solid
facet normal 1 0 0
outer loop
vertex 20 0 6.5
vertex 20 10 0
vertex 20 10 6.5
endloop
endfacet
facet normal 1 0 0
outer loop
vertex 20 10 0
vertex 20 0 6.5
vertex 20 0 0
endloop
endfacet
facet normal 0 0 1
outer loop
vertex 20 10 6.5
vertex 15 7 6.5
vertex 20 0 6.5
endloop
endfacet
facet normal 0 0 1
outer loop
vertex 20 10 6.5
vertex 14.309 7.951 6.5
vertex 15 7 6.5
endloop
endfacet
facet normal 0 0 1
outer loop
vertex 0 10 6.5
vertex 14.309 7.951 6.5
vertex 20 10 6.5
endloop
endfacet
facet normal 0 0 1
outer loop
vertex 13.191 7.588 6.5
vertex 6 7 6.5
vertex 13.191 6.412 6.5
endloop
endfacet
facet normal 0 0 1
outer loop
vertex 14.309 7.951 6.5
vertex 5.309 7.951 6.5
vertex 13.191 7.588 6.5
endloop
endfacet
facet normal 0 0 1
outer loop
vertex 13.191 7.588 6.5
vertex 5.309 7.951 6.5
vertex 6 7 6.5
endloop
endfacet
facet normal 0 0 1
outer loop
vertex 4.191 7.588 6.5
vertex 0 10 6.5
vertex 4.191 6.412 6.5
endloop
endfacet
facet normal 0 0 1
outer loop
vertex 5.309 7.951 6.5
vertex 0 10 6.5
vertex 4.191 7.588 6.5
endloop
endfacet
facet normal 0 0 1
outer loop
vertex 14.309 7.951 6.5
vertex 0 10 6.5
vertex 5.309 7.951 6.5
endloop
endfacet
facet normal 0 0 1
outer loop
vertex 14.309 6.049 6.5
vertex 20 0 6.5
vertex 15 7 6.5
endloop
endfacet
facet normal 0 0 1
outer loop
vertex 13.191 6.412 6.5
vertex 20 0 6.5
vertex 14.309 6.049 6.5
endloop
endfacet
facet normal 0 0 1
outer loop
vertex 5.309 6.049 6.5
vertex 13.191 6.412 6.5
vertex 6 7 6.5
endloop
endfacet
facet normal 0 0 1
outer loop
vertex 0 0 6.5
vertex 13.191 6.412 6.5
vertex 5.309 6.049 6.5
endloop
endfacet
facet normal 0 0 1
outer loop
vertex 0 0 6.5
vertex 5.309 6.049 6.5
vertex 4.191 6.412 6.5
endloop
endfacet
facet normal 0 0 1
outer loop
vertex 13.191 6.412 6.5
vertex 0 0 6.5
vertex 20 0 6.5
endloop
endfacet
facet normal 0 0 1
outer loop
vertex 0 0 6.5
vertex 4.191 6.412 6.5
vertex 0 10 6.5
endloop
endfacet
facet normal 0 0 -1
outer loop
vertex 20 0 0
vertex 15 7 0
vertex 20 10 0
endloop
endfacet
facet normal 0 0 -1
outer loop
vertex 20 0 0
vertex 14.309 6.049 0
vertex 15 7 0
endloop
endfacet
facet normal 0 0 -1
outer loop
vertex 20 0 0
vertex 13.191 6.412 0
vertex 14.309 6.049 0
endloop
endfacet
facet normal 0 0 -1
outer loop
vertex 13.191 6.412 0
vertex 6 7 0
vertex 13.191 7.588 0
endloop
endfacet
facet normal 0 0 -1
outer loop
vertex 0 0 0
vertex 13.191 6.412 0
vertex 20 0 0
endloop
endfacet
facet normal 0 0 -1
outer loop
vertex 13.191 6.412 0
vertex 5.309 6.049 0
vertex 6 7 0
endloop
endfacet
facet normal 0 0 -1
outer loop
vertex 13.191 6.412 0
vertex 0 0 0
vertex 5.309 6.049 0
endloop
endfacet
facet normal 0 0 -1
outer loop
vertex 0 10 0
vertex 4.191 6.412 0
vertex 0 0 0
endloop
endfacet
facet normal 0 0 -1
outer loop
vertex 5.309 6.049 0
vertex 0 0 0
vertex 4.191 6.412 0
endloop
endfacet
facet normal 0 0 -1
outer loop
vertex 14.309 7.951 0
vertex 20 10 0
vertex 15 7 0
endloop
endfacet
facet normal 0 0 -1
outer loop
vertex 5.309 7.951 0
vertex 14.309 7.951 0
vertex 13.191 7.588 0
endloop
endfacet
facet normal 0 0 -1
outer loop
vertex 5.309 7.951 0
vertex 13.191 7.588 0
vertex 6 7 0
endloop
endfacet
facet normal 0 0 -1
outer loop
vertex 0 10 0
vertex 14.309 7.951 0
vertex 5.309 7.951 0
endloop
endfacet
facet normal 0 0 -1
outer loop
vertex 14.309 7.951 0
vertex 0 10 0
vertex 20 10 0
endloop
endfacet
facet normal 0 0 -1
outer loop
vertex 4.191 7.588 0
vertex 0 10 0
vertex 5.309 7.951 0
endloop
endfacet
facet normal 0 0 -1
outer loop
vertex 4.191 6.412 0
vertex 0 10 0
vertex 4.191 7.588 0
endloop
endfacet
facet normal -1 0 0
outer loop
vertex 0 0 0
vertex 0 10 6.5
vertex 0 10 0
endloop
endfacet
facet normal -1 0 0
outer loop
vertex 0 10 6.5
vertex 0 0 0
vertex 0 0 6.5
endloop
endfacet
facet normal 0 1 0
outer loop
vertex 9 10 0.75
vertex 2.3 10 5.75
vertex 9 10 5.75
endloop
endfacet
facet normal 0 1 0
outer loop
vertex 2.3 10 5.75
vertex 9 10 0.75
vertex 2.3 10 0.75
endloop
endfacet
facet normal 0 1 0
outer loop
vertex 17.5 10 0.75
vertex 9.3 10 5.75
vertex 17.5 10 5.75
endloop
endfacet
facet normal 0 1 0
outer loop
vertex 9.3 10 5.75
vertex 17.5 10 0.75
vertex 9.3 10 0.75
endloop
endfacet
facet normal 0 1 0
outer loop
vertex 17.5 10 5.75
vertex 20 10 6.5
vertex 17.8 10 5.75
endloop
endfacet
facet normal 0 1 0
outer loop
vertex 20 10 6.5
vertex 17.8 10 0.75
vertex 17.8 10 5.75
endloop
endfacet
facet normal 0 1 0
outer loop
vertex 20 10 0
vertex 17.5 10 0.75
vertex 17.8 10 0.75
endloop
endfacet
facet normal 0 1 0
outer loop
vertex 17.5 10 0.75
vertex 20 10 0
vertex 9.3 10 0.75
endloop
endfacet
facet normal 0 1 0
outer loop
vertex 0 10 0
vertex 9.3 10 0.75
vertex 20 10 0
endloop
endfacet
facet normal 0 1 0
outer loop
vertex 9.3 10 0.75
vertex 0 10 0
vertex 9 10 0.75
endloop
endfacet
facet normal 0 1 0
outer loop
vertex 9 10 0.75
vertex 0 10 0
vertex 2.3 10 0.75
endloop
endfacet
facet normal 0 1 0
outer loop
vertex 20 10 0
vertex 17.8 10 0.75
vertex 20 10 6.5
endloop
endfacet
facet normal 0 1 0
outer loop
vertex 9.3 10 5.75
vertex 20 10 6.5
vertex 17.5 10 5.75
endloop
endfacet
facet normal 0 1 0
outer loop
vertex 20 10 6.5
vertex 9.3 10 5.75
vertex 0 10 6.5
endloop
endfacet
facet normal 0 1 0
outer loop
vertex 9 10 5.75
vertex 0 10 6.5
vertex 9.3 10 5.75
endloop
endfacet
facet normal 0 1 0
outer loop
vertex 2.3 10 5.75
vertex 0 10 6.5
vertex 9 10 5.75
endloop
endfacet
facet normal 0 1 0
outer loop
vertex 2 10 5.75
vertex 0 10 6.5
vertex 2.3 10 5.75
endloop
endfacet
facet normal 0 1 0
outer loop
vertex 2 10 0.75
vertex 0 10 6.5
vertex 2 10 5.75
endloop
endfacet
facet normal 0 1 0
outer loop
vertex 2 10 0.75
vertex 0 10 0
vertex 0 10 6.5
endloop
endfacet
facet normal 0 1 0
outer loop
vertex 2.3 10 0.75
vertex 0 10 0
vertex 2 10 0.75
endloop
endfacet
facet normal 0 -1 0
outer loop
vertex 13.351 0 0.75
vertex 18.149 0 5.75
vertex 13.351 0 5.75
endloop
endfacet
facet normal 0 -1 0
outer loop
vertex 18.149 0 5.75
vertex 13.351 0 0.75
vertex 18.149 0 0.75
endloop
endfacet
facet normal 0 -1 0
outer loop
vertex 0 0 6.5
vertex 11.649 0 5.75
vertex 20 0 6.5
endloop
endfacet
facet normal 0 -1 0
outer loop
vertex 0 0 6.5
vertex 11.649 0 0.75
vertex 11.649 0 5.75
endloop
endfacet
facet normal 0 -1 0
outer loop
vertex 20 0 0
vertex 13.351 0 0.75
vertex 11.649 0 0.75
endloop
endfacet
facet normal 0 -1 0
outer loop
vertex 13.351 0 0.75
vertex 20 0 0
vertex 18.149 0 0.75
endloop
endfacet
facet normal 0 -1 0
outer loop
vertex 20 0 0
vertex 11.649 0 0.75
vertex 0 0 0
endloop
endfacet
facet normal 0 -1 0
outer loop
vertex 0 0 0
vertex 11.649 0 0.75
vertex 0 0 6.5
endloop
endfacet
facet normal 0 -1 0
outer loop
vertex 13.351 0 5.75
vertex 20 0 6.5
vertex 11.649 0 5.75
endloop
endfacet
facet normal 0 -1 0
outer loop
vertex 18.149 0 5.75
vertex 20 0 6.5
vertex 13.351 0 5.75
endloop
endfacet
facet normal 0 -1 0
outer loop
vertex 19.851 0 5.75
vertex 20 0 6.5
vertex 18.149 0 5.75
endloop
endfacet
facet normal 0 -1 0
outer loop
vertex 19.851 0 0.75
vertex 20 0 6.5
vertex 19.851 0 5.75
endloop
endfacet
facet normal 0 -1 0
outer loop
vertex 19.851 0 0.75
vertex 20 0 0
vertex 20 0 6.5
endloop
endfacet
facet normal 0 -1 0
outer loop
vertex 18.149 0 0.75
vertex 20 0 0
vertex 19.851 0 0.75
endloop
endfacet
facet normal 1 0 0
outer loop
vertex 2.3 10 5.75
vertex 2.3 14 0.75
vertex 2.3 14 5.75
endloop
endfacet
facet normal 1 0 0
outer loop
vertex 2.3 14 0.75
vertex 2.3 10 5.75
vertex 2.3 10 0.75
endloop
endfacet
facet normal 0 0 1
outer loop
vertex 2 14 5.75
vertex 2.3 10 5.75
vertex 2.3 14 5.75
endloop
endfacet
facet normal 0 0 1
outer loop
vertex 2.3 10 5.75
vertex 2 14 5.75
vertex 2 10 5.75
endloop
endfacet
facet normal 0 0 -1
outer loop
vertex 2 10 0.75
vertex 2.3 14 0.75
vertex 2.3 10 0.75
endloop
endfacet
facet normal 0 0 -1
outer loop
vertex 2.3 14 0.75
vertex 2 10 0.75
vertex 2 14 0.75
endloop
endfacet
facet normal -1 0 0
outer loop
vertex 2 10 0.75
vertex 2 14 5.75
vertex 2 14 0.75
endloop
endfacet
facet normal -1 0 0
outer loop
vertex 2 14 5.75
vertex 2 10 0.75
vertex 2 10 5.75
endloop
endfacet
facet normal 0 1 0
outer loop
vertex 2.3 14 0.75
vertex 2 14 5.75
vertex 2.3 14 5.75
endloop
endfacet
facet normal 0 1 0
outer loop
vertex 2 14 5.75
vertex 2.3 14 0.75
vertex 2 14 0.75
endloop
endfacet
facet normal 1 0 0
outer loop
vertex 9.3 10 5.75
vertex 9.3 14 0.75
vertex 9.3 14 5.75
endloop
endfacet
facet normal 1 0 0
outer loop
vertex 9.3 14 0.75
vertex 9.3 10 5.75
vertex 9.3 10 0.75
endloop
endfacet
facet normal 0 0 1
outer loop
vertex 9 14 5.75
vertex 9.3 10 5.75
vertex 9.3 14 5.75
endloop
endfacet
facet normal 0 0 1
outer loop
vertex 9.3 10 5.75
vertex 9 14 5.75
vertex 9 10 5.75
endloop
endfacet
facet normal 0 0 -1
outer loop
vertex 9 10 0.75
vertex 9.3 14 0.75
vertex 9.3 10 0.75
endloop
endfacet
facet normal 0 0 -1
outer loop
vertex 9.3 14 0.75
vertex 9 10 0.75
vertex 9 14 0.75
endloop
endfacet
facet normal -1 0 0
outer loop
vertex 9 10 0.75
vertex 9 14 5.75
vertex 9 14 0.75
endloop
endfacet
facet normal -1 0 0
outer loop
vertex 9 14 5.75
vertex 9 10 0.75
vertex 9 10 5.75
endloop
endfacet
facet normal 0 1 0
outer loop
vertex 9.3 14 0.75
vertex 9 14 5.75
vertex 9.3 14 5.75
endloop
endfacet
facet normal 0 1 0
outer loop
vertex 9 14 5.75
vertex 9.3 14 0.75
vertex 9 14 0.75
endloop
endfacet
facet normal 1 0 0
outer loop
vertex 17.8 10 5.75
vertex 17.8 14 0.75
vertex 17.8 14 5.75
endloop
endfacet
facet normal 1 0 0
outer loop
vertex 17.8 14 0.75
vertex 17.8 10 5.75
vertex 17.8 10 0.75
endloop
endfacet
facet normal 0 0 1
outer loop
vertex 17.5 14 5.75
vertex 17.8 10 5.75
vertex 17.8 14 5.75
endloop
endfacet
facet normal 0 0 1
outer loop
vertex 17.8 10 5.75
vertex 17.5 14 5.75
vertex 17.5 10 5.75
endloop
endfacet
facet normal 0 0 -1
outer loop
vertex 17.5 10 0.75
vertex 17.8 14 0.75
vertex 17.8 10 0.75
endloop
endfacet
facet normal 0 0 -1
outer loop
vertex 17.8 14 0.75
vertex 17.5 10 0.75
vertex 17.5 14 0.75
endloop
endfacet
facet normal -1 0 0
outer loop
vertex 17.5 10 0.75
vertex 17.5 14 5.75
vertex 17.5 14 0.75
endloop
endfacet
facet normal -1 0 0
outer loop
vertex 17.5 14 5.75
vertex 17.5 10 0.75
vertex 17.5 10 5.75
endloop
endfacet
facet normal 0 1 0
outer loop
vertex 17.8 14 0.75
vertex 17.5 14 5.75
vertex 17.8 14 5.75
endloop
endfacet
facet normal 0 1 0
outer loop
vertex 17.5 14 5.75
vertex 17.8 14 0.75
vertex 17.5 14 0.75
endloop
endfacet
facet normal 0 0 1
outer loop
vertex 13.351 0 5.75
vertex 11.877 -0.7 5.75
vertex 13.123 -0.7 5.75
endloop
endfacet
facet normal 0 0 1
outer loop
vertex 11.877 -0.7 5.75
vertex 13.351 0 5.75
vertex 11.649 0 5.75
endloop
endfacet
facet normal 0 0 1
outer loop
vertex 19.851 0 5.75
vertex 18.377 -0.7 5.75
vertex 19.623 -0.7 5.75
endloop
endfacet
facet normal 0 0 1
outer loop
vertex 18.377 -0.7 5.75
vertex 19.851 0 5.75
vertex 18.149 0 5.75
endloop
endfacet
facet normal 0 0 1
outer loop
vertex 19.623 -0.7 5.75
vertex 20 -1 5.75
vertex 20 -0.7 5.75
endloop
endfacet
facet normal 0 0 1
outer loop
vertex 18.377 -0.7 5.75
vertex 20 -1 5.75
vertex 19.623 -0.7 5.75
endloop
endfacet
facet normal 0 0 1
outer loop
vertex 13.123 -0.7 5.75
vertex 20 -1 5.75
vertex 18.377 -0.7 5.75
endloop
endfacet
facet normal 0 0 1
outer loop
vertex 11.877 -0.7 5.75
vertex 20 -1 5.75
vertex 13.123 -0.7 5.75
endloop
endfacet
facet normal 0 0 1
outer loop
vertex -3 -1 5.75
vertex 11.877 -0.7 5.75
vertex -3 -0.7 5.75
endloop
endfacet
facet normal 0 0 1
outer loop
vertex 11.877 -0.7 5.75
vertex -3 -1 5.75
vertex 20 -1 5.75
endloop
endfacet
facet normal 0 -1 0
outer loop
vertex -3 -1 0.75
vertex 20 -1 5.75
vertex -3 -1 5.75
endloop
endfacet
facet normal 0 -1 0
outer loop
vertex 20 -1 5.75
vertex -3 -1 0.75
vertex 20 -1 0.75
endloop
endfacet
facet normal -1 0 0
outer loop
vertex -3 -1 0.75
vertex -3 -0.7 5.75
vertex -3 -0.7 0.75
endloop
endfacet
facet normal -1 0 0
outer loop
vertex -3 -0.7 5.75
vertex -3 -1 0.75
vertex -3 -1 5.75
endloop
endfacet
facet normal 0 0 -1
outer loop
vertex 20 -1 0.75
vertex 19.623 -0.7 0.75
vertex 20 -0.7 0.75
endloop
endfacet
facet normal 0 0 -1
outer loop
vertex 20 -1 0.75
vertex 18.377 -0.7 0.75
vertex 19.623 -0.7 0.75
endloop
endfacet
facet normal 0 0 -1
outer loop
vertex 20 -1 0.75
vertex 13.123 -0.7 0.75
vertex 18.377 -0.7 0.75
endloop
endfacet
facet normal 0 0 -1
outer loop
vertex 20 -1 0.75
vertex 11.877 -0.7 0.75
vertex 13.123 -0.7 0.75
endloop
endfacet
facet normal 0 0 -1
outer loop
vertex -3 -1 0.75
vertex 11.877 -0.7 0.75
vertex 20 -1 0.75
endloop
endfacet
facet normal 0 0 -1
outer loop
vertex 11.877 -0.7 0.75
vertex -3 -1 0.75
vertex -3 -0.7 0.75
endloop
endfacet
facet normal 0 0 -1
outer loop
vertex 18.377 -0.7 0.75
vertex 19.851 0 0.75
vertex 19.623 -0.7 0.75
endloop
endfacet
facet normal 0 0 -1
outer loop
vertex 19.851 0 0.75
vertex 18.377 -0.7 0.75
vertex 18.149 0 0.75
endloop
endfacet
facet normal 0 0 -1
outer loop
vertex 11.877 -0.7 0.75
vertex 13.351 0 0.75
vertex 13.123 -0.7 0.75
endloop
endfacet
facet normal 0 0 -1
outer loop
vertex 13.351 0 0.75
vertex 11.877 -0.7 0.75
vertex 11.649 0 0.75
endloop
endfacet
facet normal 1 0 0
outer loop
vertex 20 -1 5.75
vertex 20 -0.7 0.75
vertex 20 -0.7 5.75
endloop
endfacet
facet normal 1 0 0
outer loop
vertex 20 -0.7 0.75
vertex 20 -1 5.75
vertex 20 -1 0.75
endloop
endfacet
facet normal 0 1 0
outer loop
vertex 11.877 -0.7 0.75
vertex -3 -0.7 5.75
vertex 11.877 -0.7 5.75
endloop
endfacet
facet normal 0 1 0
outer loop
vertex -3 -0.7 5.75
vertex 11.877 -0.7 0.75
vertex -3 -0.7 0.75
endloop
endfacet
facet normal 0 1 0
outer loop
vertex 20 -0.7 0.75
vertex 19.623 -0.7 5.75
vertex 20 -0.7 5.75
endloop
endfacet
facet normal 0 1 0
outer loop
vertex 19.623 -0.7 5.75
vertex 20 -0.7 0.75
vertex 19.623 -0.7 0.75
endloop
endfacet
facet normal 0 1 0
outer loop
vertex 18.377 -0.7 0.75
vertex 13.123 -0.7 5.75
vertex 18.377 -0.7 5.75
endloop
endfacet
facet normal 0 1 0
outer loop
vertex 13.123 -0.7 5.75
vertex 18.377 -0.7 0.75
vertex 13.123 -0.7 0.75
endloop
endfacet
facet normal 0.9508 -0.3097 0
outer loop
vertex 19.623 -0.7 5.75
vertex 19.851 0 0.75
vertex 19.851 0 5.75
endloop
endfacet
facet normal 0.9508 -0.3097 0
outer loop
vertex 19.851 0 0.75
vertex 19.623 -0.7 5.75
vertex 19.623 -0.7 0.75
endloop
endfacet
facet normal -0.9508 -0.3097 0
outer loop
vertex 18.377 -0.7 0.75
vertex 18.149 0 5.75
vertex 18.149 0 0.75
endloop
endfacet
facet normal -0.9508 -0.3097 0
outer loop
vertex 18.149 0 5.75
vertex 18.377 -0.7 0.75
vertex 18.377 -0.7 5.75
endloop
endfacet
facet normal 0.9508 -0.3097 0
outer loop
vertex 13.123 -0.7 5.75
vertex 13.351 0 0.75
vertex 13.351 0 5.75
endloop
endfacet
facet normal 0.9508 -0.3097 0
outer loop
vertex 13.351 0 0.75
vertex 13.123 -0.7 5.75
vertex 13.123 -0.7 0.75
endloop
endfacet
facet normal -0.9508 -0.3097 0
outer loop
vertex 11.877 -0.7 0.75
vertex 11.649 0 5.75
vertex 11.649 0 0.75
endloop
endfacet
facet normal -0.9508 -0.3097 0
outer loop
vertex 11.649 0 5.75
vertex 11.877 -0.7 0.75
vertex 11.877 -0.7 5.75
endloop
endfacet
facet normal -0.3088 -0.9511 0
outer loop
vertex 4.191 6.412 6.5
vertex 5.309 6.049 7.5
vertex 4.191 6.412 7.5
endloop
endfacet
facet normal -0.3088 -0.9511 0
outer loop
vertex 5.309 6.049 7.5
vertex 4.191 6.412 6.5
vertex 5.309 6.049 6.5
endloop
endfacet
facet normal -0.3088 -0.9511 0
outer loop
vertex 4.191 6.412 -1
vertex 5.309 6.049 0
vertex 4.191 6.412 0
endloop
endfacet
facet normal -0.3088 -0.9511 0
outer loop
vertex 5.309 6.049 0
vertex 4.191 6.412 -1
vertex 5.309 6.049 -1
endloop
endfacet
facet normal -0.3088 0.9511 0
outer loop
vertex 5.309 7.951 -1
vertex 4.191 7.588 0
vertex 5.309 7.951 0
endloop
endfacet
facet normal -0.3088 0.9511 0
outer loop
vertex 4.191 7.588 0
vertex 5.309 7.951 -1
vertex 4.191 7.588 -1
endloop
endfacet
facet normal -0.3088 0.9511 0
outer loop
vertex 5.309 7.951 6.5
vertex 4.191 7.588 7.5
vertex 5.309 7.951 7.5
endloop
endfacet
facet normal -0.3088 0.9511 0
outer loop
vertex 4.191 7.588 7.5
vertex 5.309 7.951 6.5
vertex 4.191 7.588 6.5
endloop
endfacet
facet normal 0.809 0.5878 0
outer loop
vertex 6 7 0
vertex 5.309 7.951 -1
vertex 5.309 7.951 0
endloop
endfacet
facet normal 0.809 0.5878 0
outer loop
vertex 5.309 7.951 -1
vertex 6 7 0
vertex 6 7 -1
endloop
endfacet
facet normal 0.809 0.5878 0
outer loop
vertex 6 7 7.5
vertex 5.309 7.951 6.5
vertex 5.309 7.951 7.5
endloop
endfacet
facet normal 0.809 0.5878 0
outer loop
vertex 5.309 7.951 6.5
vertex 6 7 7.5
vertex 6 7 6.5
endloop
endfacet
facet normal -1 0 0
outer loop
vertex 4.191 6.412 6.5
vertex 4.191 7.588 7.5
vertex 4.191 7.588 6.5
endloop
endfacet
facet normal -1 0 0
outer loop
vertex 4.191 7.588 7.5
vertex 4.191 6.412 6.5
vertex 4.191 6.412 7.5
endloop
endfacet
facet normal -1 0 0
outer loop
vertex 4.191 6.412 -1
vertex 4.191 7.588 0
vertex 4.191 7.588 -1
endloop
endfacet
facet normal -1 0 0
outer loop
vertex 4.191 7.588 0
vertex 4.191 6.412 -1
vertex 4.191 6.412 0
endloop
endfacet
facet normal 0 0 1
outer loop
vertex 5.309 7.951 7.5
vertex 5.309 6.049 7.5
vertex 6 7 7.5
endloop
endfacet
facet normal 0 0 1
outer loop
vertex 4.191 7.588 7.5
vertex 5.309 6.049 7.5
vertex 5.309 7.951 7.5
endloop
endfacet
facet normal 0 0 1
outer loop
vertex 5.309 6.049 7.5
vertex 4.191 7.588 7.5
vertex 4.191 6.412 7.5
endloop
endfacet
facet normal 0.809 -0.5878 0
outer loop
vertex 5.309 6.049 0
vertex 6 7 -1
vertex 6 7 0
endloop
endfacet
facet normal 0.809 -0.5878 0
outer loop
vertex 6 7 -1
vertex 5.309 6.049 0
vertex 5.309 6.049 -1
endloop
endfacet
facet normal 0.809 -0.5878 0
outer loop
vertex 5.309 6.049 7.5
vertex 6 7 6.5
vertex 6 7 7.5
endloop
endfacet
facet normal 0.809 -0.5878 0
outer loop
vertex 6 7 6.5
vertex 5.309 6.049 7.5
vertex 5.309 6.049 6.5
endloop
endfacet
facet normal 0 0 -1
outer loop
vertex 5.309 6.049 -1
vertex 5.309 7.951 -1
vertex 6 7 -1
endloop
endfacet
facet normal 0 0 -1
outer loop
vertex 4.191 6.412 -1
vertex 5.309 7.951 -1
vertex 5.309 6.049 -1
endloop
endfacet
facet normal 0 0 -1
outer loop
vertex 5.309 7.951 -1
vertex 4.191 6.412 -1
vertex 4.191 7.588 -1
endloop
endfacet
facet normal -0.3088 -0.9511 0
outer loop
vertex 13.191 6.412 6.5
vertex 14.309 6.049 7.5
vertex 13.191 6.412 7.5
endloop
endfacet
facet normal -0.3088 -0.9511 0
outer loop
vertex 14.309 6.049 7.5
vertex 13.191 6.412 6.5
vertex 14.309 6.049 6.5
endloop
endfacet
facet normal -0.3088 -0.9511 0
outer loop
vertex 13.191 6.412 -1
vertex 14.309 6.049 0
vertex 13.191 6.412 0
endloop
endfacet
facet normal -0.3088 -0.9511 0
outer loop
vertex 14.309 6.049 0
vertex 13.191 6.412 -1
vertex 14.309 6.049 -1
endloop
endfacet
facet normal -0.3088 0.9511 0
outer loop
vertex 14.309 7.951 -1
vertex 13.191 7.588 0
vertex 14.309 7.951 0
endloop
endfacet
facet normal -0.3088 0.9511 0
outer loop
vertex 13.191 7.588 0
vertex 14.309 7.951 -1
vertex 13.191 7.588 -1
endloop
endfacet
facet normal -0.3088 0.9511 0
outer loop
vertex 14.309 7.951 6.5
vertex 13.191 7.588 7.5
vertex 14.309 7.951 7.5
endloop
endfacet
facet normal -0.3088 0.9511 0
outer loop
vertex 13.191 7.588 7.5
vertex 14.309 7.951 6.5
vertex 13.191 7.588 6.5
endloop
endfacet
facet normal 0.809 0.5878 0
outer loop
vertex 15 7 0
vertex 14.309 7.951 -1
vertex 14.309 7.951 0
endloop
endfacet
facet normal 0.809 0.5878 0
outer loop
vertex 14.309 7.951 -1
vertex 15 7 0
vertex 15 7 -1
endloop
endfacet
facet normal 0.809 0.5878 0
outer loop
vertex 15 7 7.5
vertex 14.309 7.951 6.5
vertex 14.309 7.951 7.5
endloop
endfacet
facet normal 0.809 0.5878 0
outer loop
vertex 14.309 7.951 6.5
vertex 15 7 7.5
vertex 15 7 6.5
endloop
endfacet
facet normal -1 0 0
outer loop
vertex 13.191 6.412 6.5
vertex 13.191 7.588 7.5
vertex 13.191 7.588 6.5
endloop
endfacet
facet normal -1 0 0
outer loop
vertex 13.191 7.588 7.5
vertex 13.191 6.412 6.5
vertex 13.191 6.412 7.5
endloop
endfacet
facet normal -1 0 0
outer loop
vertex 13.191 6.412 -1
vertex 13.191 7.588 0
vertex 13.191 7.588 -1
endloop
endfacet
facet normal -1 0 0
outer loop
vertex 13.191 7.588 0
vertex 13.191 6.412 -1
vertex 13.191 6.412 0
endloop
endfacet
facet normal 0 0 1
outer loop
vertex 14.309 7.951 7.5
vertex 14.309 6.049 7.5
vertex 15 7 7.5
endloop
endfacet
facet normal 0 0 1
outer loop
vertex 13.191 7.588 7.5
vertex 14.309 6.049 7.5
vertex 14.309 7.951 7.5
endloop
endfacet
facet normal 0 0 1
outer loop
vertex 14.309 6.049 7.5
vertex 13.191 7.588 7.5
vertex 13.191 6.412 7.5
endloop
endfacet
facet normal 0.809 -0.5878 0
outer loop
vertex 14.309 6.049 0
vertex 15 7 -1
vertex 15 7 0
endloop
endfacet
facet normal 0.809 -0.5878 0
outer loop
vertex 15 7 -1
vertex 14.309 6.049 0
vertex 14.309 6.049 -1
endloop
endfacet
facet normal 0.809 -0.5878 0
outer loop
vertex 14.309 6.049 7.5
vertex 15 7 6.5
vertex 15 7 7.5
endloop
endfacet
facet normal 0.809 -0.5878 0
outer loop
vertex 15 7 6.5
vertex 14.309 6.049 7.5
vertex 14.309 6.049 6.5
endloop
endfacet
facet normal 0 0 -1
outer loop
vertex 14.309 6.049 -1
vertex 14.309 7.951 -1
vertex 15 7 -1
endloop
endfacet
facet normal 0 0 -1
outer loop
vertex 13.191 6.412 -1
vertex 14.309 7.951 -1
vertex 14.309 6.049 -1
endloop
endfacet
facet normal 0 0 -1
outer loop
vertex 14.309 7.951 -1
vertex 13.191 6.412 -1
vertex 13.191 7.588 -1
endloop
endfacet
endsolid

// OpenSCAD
module EndSwitchBody20x11(boltOnly=0)
{
	if( !boltOnly )
	{
		color( "black") cube([20,10,6.5]);
		color ("Silver") translate([2,10,1.5/2]) cube([0.3,4,5]);
		color ("Silver") translate([9,10,1.5/2]) cube([0.3,4,5]);
		color ("Silver") translate([17.5,10,1.5/2]) cube([0.3,4,5]);
		color ("Silver") translate([20,-1,1.5/2]) rotate([0,0,0+90]) cube([0.3,23,5]);
		color ("Silver") translate([19,0,1.5/2]) rotate([0,0,0+90]) cylinder(r=1.0,h=5);
		color ("red") translate([12.5,0,1.5/2]) rotate([0,0,0+90]) cylinder(r=1.0,h=5);
		color ("red") translate([5,7,-1]) cylinder(r=1.0,h=8.5);
		color ("red") translate([5,7,-1]) cylinder(r=1.0,h=8.5);
		color ("red") translate([14,7,-1]) cylinder(r=1.0,h=8.5);
	}
	else
	{
		color ("red") translate([5,7,-10]) cylinder(r=1.0,h=10+6.5+10);
		color ("red") translate([14,7,-10]) cylinder(r=1.0,h=10+6.5+10);
	}
	//translate([-3,-3,0])  cube([3,3,5]);
}
EndSwitchBody20x11();
